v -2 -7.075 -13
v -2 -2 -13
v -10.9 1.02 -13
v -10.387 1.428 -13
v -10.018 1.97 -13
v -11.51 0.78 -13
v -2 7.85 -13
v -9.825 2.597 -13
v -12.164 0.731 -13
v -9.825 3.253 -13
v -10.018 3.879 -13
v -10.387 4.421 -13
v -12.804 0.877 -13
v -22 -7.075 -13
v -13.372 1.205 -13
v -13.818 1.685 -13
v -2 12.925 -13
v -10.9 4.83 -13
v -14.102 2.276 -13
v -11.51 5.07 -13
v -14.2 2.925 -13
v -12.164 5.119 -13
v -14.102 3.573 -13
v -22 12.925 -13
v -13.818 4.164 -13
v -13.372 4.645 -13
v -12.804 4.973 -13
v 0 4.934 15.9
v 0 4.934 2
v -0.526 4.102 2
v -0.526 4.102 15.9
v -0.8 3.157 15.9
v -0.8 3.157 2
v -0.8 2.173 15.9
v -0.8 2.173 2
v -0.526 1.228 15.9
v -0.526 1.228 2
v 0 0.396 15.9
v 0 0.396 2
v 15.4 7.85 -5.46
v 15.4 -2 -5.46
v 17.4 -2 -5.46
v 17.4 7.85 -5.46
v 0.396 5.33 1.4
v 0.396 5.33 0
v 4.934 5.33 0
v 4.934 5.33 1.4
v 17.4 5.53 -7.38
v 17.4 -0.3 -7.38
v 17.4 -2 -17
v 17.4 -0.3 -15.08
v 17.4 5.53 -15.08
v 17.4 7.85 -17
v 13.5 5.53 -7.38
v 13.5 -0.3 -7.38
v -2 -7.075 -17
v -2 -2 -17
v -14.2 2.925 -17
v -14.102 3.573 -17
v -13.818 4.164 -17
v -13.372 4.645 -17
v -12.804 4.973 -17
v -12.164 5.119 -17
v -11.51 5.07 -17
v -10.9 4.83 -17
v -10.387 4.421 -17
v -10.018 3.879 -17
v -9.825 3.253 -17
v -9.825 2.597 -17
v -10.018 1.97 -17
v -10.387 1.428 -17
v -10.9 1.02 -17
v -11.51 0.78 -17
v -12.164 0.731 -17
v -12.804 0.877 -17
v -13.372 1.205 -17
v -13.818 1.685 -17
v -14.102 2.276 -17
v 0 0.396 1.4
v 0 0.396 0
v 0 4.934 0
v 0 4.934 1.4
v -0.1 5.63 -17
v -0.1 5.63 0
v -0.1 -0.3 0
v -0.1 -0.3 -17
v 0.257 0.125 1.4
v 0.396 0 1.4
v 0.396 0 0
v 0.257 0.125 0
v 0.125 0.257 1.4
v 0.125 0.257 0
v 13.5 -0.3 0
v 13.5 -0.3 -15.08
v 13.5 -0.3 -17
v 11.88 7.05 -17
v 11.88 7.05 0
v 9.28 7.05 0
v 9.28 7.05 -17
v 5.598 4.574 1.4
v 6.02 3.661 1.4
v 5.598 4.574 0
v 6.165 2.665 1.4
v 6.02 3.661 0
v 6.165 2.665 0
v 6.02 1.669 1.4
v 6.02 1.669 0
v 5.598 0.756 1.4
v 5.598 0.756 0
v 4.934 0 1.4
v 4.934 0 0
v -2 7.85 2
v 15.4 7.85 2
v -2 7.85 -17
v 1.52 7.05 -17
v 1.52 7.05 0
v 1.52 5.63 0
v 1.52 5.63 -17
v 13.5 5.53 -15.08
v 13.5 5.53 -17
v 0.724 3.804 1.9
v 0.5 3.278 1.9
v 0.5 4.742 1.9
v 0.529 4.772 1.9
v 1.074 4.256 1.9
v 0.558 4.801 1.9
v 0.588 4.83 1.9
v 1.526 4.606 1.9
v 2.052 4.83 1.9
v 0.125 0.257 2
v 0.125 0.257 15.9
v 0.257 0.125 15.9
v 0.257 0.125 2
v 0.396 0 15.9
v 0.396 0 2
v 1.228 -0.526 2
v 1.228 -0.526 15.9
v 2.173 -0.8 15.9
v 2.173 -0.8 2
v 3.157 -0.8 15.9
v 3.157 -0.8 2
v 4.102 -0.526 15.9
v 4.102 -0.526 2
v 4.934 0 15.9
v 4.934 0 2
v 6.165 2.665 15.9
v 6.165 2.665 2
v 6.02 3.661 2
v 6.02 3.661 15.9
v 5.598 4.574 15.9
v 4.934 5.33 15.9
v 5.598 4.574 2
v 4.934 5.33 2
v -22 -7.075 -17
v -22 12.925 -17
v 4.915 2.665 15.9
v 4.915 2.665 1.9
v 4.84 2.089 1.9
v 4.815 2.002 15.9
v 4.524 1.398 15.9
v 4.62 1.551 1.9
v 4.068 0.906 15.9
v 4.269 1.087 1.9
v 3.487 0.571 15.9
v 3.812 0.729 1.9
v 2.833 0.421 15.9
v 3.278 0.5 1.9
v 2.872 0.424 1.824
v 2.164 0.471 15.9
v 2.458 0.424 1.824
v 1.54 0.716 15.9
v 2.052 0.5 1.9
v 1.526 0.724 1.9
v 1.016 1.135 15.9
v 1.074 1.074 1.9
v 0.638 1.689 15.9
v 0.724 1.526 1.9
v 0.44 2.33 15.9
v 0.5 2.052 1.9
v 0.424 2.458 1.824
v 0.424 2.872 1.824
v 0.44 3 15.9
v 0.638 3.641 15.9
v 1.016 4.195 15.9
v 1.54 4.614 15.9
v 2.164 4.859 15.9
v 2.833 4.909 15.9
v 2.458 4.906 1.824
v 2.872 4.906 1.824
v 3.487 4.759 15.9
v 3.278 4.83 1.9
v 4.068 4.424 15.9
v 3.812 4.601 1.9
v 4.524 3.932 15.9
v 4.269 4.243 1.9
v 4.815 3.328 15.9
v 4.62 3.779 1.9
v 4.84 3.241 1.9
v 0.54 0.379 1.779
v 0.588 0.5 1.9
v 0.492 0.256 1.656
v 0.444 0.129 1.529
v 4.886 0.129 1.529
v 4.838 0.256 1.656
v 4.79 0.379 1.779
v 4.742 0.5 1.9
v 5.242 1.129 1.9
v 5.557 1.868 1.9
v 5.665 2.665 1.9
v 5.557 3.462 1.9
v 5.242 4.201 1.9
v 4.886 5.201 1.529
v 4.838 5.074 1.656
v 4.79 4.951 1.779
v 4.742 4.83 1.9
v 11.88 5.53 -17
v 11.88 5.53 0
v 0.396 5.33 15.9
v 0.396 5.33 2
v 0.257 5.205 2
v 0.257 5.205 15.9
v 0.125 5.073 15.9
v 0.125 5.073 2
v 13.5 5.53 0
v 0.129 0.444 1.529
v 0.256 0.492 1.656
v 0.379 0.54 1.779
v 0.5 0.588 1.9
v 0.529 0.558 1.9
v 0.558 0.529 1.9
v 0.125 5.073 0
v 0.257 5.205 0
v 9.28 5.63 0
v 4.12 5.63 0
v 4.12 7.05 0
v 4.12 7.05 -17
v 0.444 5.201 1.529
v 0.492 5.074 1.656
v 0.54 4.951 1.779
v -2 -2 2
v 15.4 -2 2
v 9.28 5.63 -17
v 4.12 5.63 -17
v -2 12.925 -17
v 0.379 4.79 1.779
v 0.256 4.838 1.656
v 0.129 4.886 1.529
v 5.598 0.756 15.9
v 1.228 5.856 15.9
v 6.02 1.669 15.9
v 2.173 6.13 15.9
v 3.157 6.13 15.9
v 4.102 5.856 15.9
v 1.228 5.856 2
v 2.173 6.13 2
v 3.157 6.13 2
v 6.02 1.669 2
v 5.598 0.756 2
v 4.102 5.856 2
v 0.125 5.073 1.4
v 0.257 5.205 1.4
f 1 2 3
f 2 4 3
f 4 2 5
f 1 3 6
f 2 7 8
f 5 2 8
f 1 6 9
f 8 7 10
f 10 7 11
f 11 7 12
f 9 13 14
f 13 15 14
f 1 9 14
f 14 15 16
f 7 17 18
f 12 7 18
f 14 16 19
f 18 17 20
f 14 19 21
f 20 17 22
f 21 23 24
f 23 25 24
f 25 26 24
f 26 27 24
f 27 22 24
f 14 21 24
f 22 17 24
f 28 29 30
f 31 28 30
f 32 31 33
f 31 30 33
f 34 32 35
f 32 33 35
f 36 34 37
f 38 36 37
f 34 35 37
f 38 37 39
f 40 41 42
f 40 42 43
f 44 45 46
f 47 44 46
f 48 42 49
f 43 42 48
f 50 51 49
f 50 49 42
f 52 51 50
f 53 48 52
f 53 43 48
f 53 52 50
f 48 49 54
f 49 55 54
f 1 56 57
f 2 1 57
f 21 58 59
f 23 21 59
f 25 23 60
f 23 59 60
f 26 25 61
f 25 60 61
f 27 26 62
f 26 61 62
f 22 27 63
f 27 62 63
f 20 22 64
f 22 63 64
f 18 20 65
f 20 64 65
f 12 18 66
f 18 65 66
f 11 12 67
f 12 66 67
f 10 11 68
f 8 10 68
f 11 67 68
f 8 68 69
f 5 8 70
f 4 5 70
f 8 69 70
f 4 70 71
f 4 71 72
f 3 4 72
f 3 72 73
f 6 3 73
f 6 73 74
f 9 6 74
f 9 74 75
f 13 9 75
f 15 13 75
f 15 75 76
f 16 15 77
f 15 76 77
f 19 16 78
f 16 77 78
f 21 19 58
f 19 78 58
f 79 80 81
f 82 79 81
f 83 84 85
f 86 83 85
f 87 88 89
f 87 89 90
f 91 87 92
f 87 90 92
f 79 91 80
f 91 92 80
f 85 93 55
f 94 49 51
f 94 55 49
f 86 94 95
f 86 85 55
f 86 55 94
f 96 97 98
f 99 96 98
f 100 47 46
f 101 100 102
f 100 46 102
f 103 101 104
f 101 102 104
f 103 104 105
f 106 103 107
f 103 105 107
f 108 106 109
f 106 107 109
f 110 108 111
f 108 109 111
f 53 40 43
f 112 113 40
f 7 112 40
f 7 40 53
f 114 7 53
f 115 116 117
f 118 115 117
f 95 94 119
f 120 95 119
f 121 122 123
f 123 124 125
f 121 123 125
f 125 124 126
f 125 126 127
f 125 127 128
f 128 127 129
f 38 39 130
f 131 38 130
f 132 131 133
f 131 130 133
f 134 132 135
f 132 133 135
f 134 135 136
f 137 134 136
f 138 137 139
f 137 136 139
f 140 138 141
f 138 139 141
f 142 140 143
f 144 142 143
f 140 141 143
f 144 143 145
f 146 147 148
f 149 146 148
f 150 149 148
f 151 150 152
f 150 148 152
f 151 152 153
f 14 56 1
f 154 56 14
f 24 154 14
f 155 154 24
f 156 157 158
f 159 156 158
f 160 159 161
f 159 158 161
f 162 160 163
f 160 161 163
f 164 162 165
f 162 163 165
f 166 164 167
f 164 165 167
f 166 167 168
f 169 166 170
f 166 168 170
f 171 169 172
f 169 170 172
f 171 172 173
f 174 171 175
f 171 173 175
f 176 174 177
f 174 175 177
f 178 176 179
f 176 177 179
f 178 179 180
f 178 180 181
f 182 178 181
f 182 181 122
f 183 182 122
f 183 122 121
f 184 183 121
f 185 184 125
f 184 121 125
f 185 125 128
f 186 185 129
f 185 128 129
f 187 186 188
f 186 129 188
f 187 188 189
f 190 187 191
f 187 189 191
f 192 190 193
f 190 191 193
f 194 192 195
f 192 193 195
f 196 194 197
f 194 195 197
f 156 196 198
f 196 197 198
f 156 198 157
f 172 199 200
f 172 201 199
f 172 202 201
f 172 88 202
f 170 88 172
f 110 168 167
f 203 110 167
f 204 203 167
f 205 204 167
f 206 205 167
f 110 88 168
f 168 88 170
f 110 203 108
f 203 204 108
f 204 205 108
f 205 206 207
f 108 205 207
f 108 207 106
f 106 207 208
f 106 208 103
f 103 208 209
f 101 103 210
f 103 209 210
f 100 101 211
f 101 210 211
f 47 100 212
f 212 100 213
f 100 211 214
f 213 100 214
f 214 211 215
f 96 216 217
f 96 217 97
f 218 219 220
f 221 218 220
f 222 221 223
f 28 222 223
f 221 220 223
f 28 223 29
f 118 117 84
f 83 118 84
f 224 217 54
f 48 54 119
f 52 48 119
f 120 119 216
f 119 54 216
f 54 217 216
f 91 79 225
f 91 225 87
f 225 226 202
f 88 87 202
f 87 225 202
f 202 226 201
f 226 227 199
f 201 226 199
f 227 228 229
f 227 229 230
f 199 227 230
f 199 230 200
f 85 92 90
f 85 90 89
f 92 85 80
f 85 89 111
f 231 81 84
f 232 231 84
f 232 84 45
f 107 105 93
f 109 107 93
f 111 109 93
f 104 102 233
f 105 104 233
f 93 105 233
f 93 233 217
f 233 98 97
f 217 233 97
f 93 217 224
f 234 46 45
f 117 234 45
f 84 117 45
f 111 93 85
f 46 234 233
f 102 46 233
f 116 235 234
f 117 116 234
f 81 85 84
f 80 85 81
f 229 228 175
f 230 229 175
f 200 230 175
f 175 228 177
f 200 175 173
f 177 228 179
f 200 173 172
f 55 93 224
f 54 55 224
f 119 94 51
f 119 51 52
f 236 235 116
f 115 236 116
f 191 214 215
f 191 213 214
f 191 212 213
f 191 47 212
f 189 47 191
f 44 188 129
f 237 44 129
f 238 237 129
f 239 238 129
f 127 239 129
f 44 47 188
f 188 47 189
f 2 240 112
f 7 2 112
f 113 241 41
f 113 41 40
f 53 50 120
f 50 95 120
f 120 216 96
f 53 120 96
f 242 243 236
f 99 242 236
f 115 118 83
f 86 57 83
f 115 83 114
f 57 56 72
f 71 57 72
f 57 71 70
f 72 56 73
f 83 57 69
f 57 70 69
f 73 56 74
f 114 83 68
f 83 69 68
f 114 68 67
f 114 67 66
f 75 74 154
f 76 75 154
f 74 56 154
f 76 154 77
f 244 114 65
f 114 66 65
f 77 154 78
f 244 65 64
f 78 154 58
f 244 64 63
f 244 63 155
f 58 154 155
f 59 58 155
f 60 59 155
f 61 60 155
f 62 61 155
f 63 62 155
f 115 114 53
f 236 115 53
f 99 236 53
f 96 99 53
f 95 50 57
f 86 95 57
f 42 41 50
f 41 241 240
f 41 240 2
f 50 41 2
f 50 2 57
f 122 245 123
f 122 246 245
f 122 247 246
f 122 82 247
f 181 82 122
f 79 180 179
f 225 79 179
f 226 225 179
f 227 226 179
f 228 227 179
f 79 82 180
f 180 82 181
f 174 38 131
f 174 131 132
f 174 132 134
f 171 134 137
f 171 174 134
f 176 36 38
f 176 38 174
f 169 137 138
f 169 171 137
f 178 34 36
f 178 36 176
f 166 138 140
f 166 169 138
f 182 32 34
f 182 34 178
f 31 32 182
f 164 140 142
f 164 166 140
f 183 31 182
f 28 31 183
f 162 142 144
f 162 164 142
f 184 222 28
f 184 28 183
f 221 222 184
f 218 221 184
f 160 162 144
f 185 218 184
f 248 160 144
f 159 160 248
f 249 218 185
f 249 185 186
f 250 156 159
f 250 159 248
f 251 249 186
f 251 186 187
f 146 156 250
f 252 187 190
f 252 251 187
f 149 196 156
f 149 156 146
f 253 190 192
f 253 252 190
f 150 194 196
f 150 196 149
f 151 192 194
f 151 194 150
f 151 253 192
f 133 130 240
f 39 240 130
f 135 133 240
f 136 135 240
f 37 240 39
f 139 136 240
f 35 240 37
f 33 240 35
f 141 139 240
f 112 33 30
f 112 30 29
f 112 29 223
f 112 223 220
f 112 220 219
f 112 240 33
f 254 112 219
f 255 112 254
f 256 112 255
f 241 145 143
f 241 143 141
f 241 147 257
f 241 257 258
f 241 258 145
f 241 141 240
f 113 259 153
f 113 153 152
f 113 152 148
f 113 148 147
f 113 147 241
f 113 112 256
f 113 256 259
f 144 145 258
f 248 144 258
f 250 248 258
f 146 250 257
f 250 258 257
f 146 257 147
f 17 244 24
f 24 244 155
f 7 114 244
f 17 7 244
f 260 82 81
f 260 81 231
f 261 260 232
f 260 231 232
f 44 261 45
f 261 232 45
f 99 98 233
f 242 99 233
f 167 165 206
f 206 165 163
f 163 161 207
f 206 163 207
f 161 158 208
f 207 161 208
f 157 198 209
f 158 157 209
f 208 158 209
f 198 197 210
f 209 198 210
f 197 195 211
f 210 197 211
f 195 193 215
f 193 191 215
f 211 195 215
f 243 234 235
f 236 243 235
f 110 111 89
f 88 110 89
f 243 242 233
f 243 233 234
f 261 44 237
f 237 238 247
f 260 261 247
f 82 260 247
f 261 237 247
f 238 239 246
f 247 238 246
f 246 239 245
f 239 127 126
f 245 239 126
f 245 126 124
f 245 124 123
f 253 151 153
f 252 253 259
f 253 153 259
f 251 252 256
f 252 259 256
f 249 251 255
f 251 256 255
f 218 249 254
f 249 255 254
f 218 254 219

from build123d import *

# Parameters (mm, degrees)
SKETCH1_W           = 17.4
SKETCH1_H           = 9.850463562
BOSS_EXTRUDE1_DEPTH = 2
BOSS_EXTRUDE2_START = 1.9
SKETCH1_4_R         = 2.25
BOSS_EXTRUDE2_DEPTH = 14
SKETCH2_W           = 17.4
SKETCH2_H           = 9.850463562
BOSS_EXTRUDE3_DEPTH = 17
SKETCH4_W           = 7.7
SKETCH4_H           = 5.83
CUT_EXTRUDE1_DEPTH  = 1.9
SKETCH5_W           = 20
SKETCH5_H           = 20
SKETCH5_R           = 2.2
BOSS_EXTRUDE4_DEPTH = 4
CHAMFER1_SIZE       = 0.5
SKETCH6_W           = 11.54
SKETCH6_H           = 9.850463562
SKETCH6_W_2         = 7.7
SKETCH6_H_2         = 5.83
BOSS_EXTRUDE5_DEPTH = 2


with BuildPart() as part:
    # Sketch1 → Boss-Extrude1 (new body)
    with BuildSketch(Plane.XY):
        with Locations((6.7, 2.924768219)):
            Rectangle(SKETCH1_W, SKETCH1_H)
        with BuildLine():
            Line((0, 0.396129135), (0, 4.933870865))
            ThreePointArc((0, 4.933870865), (0.190126266, 5.139873734), (0.396129135, 5.33))
            Line((0.396129135, 5.33), (4.933870865, 5.33))
            ThreePointArc((4.933870865, 5.33), (6.165, 2.665), (4.933870865, 0))
            Line((4.933870865, 0), (0.396129135, 0))
            ThreePointArc((0.396129135, 0), (0.190126266, 0.190126266), (0, 0.396129135))
        make_face(mode=Mode.SUBTRACT)
    extrude(amount=BOSS_EXTRUDE1_DEPTH)

    # Sketch1<4> → Boss-Extrude2 (add)
    # profile 1 of 4: a face of its own
    with BuildSketch(Plane.XY.offset(BOSS_EXTRUDE2_START)):
        with BuildLine():
            ThreePointArc((0.396129135, 5.33), (0.190126266, 5.139873734), (0, 4.933870865))
            Line((0, 4.933870865), (0, 0.396129135))
            ThreePointArc((0, 0.396129135), (0.190126266, 0.190126266), (0.396129135, 0))
            Line((0.396129135, 0), (4.933870865, 0))
            ThreePointArc((4.933870865, 0), (5.842345435, 1.197186665), (6.165, 2.665))
            ThreePointArc((6.165, 2.665), (5.842345435, 4.132813335), (4.933870865, 5.33))
            Line((4.933870865, 5.33), (0.396129135, 5.33))
        make_face()
        with Locations((2.665, 2.665)):
            Circle(SKETCH1_4_R, mode=Mode.SUBTRACT)
    # profile 2 of 4: a face of its own
    with BuildSketch(Plane.XY.offset(BOSS_EXTRUDE2_START)):
        with BuildLine():
            Line((0, 0.396129135), (0, 4.933870865))
            ThreePointArc((0, 4.933870865), (-0.835, 2.665), (0, 0.396129135))
        make_face()
    # profile 3 of 4: a face of its own
    with BuildSketch(Plane.XY.offset(BOSS_EXTRUDE2_START)):
        with BuildLine():
            ThreePointArc((4.933870865, 5.33), (2.665, 6.165), (0.396129135, 5.33))
            Line((0.396129135, 5.33), (4.933870865, 5.33))
        make_face()
    # profile 4 of 4: a face of its own
    with BuildSketch(Plane.XY.offset(BOSS_EXTRUDE2_START)):
        with BuildLine():
            Line((4.933870865, 0), (0.396129135, 0))
            ThreePointArc((0.396129135, 0), (2.665, -0.835), (4.933870865, 0))
        make_face()
    extrude(amount=BOSS_EXTRUDE2_DEPTH)

    # Sketch2 → Boss-Extrude3 (add)
    with BuildSketch(Plane(origin=(0, 0, 0), x_dir=(-1, 0, 0), z_dir=(0, 0, -1))):
        with Locations((-6.7, 2.924768219)):
            Rectangle(SKETCH2_W, SKETCH2_H)
        Polygon((-13.5, 5.53), (-11.88, 5.53), (-11.88, 7.05), (-9.28, 7.05), (-9.28, 5.63), (-4.12, 5.63), (-4.12, 7.05), (-1.52, 7.05), (-1.52, 5.63), (0.1, 5.63), (0.1, -0.3), (-13.5, -0.3), align=None, mode=Mode.SUBTRACT)
    extrude(amount=BOSS_EXTRUDE3_DEPTH)

    # Sketch4 → Cut-Extrude1 (cut)
    with BuildSketch(Plane.ZY.offset(-13.5)):
        with Locations((-11.23, 2.615)):
            Rectangle(SKETCH4_W, SKETCH4_H)
    extrude(amount=-CUT_EXTRUDE1_DEPTH, mode=Mode.SUBTRACT)

    # Sketch5 → Boss-Extrude4 (add)
    with BuildSketch(Plane(origin=(0, 0, -17), x_dir=(-1, 0, 0), z_dir=(0, 0, -1))):
        with Locations((12, 2.924768219)):
            Rectangle(SKETCH5_W, SKETCH5_H)
        with Locations((12, 2.924768219)):
            Circle(SKETCH5_R, mode=Mode.SUBTRACT)
    extrude(amount=-BOSS_EXTRUDE4_DEPTH)

    # Chamfer1
    # the kernel refuses this chamfer: 0.5 mm, written as the material it adds along each edge
    with BuildSketch(Plane(origin=(0, -0.889712359, 1.9), x_dir=(-0.027495876610586365, 0, -0.9996219169112968), z_dir=(0, 1, 0))) as chamfer1_piece_1_section:
        Polygon((CHAMFER1_SIZE * 0.999621916911, -CHAMFER1_SIZE * 0.0274958766106), (-CHAMFER1_SIZE * 0.0274958766106, -CHAMFER1_SIZE * 0.999621916911), (0, 0), align=None)
    chamfer1_piece_1 = extrude(amount=7.109424717, mode=Mode.PRIVATE)
    chamfer1_piece_1 = chamfer1_piece_1 - Plane(origin=(2.665, 2.665, 1.727474794), x_dir=(1, 0, 0), z_dir=(0, 0, -1)) * Cylinder(2.25, 17, mode=Mode.PRIVATE)
    add(chamfer1_piece_1)
    with BuildSketch(Plane(origin=(-0.889712359, 5.33, 1.9), x_dir=(0, 0.027495876610585623, -0.9996219169112968), z_dir=(1, 0, 0))) as chamfer1_piece_2_section:
        Polygon((CHAMFER1_SIZE * 0.999621916911, -CHAMFER1_SIZE * 0.0274958766106), (-CHAMFER1_SIZE * 0.0274958766106, -CHAMFER1_SIZE * 0.999621916911), (0, 0), align=None)
    chamfer1_piece_2 = extrude(amount=7.109424717, mode=Mode.PRIVATE)
    chamfer1_piece_2 = chamfer1_piece_2 - Plane(origin=(2.665, 2.665, 1.727474794), x_dir=(1, 0, 0), z_dir=(0, 0, -1)) * Cylinder(2.25, 17, mode=Mode.PRIVATE)
    add(chamfer1_piece_2)
    with BuildSketch(Plane(origin=(6.219712359, 0, 1.9), x_dir=(0, -0.027495876610586365, -0.9996219169112968), z_dir=(-1, 0, 0))) as chamfer1_piece_3_section:
        Polygon((CHAMFER1_SIZE * 0.999621916911, -CHAMFER1_SIZE * 0.0274958766106), (-CHAMFER1_SIZE * 0.0274958766106, -CHAMFER1_SIZE * 0.999621916911), (0, 0), align=None)
    chamfer1_piece_3 = extrude(amount=7.109424717, mode=Mode.PRIVATE)
    chamfer1_piece_3 = chamfer1_piece_3 - Plane(origin=(2.665, 2.665, 1.727474794), x_dir=(1, 0, 0), z_dir=(0, 0, -1)) * Cylinder(2.25, 17, mode=Mode.PRIVATE)
    add(chamfer1_piece_3)
    with BuildSketch(Plane(origin=(2.665, 2.665, 1.9), x_dir=(-0.9434537391287974, -0.3315042113215022, 0), z_dir=(-0.3315042113215022, 0.9434537391287974, 0))) as chamfer1_piece_4:
        Polygon((3.5, -CHAMFER1_SIZE), (3.5 - CHAMFER1_SIZE, 0), (3.5, 0), align=None)
    revolve(axis=Axis((2.665, 2.665, 1.9), (0, 0, 1)), revolution_arc=51.27979911)
    with BuildSketch(Plane(origin=(2.665, 2.665, 1.9), x_dir=(0.33133655383280003, -0.943512632715749, 0), z_dir=(-0.943512632715749, -0.33133655383280003, 0))) as chamfer1_piece_5:
        Polygon((3.5, -CHAMFER1_SIZE), (3.5 - CHAMFER1_SIZE, 0), (3.5, 0), align=None)
    revolve(axis=Axis((2.665, 2.665, 1.9), (0, 0, 1)), revolution_arc=141.300162094)
    with BuildSketch(Plane(origin=(2.665, 2.665, 1.9), x_dir=(-0.33150421132149205, 0.9434537391288009, 0), z_dir=(0.9434537391288009, 0.33150421132149205, 0))) as chamfer1_piece_6:
        Polygon((3.5, -CHAMFER1_SIZE), (3.5 - CHAMFER1_SIZE, 0), (3.5, 0), align=None)
    revolve(axis=Axis((2.665, 2.665, 1.9), (0, 0, 1)), revolution_arc=51.27979911)

    # Sketch6 → Boss-Extrude5 (add)
    with BuildSketch(Plane(origin=(15.4, 0, 0), x_dir=(0, 0, -1), z_dir=(1, 0, 0))):
        with Locations((11.23, 2.924768219)):
            Rectangle(SKETCH6_W, SKETCH6_H)
        with Locations((11.23, 2.615)):
            Rectangle(SKETCH6_W_2, SKETCH6_H_2, mode=Mode.SUBTRACT)
    extrude(amount=BOSS_EXTRUDE5_DEPTH)


solid = part.part
